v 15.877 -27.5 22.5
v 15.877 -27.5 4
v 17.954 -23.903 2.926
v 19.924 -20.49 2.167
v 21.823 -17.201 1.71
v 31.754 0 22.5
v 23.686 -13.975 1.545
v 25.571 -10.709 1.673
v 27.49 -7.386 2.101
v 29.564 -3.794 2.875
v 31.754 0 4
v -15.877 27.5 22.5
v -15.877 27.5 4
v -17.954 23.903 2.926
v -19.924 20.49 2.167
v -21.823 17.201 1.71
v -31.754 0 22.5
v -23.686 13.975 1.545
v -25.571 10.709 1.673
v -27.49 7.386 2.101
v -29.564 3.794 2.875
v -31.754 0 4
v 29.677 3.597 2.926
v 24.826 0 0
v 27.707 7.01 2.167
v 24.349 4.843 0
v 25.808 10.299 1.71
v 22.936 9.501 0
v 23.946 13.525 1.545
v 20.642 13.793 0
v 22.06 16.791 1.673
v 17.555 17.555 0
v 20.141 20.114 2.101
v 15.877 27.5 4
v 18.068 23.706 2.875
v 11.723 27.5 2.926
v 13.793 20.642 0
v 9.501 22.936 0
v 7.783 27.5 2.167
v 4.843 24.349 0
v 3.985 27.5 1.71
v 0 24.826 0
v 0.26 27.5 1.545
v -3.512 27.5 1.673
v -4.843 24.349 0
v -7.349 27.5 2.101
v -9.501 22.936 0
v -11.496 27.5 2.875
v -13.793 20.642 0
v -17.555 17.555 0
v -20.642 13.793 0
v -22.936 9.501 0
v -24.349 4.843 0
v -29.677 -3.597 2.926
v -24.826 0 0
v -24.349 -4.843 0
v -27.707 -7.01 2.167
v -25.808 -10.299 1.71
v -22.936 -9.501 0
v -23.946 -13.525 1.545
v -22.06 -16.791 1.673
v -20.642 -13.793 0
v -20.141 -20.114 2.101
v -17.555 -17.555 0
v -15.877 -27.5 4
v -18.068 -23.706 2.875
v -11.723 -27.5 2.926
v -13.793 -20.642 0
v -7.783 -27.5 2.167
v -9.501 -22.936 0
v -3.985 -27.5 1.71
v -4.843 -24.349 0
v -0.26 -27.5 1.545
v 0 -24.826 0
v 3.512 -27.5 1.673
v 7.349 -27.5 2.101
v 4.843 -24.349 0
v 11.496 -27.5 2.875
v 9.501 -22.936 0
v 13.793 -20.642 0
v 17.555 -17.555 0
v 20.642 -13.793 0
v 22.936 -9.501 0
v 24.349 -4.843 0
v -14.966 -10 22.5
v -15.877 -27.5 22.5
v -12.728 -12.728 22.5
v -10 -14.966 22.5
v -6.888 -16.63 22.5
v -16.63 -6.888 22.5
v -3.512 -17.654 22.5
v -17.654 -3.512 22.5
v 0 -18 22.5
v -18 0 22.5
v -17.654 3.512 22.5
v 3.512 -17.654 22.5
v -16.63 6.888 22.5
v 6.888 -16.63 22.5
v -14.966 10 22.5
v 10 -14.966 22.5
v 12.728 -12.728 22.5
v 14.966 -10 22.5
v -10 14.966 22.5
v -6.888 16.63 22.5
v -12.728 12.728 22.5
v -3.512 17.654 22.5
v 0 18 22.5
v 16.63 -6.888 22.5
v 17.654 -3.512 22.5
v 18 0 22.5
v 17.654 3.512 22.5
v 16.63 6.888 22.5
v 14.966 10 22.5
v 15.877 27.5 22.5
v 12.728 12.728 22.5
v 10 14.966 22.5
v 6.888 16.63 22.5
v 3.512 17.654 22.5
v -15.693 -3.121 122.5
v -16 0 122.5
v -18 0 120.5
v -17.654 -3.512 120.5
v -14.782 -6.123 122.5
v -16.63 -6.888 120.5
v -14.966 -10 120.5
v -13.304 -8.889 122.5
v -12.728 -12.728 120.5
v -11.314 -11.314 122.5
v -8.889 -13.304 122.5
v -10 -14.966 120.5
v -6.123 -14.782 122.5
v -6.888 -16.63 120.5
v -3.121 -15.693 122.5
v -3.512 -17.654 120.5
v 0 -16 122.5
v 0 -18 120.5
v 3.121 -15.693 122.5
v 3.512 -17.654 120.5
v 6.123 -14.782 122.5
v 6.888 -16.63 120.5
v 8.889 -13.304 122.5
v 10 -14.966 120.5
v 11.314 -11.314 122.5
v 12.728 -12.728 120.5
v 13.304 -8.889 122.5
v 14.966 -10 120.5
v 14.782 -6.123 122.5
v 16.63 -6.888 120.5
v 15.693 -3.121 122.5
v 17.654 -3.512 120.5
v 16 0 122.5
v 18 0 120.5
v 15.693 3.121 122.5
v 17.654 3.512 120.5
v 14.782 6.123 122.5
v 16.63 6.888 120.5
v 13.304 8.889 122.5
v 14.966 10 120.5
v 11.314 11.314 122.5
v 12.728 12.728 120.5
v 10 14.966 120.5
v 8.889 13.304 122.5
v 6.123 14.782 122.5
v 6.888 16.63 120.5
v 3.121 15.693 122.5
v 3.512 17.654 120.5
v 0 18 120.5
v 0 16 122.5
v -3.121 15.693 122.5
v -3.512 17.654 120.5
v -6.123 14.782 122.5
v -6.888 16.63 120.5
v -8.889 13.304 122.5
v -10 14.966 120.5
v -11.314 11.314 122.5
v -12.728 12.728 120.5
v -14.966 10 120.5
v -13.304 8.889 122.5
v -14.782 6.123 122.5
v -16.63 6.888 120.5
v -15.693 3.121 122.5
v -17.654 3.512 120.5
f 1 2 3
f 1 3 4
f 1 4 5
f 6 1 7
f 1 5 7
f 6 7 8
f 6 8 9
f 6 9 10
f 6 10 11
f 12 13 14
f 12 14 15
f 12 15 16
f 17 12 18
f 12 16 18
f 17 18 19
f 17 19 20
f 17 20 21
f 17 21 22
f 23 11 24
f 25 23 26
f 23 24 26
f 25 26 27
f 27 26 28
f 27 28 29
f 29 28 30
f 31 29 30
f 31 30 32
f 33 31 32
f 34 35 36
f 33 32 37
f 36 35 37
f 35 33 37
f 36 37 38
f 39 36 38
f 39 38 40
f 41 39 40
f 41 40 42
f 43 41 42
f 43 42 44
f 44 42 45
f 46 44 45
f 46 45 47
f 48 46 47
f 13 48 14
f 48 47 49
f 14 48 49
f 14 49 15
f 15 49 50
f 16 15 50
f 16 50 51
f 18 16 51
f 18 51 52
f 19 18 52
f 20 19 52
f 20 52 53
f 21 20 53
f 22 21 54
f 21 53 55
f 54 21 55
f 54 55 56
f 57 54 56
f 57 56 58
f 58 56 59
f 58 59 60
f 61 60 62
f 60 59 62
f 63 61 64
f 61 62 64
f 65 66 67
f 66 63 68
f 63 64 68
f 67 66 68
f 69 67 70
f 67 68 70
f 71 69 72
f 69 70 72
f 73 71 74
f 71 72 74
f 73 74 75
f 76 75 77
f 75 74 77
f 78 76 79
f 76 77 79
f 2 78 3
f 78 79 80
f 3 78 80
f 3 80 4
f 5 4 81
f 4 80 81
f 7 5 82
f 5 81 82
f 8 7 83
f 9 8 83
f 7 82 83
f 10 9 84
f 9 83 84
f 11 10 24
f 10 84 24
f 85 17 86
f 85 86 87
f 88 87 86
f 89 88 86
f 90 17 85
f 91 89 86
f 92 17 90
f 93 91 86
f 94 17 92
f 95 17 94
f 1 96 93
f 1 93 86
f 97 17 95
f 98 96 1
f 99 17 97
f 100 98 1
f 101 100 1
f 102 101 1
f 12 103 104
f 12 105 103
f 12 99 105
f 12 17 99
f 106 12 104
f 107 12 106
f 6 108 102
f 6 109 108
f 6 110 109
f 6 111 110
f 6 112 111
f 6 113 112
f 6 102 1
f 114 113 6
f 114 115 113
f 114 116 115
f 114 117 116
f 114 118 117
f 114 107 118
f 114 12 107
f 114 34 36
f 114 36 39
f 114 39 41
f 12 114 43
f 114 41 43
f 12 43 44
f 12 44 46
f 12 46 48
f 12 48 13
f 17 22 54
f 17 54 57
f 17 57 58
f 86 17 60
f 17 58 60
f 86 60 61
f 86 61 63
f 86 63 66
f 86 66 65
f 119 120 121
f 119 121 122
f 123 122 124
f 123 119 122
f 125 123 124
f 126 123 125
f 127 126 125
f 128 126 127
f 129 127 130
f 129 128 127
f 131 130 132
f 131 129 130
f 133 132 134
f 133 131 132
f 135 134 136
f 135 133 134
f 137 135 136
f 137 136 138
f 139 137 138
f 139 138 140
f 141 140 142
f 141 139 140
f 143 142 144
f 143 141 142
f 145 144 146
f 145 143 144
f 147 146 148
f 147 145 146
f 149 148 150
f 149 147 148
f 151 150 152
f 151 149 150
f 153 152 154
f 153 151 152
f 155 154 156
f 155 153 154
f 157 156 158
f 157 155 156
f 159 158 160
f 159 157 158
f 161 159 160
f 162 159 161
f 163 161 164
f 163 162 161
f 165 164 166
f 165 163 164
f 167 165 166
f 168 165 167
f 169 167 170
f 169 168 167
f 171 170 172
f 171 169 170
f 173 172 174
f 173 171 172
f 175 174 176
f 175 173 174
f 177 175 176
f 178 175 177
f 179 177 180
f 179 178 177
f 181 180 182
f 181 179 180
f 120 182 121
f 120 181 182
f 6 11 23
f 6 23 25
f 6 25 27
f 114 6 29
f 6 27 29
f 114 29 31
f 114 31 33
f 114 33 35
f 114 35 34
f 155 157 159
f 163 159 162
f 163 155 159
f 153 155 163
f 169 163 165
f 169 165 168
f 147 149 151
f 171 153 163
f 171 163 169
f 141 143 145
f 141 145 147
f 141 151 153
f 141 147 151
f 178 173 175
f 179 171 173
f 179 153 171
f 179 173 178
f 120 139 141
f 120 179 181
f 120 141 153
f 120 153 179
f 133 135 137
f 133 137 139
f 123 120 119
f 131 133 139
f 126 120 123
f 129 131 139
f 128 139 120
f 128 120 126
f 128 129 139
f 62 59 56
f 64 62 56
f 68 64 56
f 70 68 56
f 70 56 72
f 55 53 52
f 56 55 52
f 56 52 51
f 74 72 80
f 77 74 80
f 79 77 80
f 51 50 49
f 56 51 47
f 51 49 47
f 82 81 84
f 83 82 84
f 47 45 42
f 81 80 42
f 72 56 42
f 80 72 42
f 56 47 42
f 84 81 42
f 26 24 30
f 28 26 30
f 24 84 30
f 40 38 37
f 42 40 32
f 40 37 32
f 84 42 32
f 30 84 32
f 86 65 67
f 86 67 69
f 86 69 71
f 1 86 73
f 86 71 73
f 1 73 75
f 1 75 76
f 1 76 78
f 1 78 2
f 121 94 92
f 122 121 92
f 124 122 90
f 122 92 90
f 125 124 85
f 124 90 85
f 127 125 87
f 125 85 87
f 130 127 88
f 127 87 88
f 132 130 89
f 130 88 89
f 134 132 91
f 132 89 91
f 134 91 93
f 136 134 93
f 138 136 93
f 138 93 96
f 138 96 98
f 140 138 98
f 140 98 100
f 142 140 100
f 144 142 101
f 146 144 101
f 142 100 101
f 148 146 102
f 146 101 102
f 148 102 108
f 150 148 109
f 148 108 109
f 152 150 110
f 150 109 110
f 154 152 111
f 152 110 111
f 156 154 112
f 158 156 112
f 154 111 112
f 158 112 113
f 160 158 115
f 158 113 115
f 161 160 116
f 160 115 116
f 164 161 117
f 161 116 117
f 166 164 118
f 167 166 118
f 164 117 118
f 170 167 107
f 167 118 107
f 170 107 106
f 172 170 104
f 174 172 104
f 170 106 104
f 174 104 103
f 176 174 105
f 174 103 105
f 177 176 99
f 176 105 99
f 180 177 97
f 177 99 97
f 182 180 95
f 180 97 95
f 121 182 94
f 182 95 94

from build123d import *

# Parameters (mm, degrees)
EXTRUDE_1_DEPTH = 22.5
SKETCH_2_R      = 18
EXTRUDE_2_DEPTH = 100
CHAMFER_1_SIZE  = 2


# Read off the part's stored shape, not the designer's step: 切除-旋转-薄壁1
with BuildPart() as part:
    # 草图1 → 拉伸1 (new body)
    with BuildSketch(Plane.XY):
        Polygon((31.754264805, 0), (15.877132403, 27.5), (-15.877132403, 27.5), (-31.754264805, 0), (-15.877132403, -27.5), (15.877132403, -27.5), align=None)
    extrude(amount=EXTRUDE_1_DEPTH)

    # 草图2 → 拉伸2 (add)
    with BuildSketch(Plane.XY.offset(22.5)):
        with Locations(Location((0, 0, 0), (0, 0, 180))):
            Circle(SKETCH_2_R)
    extrude(amount=EXTRUDE_2_DEPTH)

    # 切除-旋转-薄壁1 outline → 切除-旋转-薄壁1 (revolve, cut)
    with BuildSketch(Plane.XZ):
        Polygon((31.754264936, 4.000000075), (24.826061575, 0), (31.754264936, 0), align=None)
    revolve(axis=Axis((0, 0, 0), (0, 0, 1)), mode=Mode.SUBTRACT)

    # 倒角1
    chamfer_1_edges = [part.edges().sort_by_distance(p)[0] for p in [
        (18, 0, 122.5),
    ]]
    chamfer(chamfer_1_edges, length=CHAMFER_1_SIZE)


solid = part.part
